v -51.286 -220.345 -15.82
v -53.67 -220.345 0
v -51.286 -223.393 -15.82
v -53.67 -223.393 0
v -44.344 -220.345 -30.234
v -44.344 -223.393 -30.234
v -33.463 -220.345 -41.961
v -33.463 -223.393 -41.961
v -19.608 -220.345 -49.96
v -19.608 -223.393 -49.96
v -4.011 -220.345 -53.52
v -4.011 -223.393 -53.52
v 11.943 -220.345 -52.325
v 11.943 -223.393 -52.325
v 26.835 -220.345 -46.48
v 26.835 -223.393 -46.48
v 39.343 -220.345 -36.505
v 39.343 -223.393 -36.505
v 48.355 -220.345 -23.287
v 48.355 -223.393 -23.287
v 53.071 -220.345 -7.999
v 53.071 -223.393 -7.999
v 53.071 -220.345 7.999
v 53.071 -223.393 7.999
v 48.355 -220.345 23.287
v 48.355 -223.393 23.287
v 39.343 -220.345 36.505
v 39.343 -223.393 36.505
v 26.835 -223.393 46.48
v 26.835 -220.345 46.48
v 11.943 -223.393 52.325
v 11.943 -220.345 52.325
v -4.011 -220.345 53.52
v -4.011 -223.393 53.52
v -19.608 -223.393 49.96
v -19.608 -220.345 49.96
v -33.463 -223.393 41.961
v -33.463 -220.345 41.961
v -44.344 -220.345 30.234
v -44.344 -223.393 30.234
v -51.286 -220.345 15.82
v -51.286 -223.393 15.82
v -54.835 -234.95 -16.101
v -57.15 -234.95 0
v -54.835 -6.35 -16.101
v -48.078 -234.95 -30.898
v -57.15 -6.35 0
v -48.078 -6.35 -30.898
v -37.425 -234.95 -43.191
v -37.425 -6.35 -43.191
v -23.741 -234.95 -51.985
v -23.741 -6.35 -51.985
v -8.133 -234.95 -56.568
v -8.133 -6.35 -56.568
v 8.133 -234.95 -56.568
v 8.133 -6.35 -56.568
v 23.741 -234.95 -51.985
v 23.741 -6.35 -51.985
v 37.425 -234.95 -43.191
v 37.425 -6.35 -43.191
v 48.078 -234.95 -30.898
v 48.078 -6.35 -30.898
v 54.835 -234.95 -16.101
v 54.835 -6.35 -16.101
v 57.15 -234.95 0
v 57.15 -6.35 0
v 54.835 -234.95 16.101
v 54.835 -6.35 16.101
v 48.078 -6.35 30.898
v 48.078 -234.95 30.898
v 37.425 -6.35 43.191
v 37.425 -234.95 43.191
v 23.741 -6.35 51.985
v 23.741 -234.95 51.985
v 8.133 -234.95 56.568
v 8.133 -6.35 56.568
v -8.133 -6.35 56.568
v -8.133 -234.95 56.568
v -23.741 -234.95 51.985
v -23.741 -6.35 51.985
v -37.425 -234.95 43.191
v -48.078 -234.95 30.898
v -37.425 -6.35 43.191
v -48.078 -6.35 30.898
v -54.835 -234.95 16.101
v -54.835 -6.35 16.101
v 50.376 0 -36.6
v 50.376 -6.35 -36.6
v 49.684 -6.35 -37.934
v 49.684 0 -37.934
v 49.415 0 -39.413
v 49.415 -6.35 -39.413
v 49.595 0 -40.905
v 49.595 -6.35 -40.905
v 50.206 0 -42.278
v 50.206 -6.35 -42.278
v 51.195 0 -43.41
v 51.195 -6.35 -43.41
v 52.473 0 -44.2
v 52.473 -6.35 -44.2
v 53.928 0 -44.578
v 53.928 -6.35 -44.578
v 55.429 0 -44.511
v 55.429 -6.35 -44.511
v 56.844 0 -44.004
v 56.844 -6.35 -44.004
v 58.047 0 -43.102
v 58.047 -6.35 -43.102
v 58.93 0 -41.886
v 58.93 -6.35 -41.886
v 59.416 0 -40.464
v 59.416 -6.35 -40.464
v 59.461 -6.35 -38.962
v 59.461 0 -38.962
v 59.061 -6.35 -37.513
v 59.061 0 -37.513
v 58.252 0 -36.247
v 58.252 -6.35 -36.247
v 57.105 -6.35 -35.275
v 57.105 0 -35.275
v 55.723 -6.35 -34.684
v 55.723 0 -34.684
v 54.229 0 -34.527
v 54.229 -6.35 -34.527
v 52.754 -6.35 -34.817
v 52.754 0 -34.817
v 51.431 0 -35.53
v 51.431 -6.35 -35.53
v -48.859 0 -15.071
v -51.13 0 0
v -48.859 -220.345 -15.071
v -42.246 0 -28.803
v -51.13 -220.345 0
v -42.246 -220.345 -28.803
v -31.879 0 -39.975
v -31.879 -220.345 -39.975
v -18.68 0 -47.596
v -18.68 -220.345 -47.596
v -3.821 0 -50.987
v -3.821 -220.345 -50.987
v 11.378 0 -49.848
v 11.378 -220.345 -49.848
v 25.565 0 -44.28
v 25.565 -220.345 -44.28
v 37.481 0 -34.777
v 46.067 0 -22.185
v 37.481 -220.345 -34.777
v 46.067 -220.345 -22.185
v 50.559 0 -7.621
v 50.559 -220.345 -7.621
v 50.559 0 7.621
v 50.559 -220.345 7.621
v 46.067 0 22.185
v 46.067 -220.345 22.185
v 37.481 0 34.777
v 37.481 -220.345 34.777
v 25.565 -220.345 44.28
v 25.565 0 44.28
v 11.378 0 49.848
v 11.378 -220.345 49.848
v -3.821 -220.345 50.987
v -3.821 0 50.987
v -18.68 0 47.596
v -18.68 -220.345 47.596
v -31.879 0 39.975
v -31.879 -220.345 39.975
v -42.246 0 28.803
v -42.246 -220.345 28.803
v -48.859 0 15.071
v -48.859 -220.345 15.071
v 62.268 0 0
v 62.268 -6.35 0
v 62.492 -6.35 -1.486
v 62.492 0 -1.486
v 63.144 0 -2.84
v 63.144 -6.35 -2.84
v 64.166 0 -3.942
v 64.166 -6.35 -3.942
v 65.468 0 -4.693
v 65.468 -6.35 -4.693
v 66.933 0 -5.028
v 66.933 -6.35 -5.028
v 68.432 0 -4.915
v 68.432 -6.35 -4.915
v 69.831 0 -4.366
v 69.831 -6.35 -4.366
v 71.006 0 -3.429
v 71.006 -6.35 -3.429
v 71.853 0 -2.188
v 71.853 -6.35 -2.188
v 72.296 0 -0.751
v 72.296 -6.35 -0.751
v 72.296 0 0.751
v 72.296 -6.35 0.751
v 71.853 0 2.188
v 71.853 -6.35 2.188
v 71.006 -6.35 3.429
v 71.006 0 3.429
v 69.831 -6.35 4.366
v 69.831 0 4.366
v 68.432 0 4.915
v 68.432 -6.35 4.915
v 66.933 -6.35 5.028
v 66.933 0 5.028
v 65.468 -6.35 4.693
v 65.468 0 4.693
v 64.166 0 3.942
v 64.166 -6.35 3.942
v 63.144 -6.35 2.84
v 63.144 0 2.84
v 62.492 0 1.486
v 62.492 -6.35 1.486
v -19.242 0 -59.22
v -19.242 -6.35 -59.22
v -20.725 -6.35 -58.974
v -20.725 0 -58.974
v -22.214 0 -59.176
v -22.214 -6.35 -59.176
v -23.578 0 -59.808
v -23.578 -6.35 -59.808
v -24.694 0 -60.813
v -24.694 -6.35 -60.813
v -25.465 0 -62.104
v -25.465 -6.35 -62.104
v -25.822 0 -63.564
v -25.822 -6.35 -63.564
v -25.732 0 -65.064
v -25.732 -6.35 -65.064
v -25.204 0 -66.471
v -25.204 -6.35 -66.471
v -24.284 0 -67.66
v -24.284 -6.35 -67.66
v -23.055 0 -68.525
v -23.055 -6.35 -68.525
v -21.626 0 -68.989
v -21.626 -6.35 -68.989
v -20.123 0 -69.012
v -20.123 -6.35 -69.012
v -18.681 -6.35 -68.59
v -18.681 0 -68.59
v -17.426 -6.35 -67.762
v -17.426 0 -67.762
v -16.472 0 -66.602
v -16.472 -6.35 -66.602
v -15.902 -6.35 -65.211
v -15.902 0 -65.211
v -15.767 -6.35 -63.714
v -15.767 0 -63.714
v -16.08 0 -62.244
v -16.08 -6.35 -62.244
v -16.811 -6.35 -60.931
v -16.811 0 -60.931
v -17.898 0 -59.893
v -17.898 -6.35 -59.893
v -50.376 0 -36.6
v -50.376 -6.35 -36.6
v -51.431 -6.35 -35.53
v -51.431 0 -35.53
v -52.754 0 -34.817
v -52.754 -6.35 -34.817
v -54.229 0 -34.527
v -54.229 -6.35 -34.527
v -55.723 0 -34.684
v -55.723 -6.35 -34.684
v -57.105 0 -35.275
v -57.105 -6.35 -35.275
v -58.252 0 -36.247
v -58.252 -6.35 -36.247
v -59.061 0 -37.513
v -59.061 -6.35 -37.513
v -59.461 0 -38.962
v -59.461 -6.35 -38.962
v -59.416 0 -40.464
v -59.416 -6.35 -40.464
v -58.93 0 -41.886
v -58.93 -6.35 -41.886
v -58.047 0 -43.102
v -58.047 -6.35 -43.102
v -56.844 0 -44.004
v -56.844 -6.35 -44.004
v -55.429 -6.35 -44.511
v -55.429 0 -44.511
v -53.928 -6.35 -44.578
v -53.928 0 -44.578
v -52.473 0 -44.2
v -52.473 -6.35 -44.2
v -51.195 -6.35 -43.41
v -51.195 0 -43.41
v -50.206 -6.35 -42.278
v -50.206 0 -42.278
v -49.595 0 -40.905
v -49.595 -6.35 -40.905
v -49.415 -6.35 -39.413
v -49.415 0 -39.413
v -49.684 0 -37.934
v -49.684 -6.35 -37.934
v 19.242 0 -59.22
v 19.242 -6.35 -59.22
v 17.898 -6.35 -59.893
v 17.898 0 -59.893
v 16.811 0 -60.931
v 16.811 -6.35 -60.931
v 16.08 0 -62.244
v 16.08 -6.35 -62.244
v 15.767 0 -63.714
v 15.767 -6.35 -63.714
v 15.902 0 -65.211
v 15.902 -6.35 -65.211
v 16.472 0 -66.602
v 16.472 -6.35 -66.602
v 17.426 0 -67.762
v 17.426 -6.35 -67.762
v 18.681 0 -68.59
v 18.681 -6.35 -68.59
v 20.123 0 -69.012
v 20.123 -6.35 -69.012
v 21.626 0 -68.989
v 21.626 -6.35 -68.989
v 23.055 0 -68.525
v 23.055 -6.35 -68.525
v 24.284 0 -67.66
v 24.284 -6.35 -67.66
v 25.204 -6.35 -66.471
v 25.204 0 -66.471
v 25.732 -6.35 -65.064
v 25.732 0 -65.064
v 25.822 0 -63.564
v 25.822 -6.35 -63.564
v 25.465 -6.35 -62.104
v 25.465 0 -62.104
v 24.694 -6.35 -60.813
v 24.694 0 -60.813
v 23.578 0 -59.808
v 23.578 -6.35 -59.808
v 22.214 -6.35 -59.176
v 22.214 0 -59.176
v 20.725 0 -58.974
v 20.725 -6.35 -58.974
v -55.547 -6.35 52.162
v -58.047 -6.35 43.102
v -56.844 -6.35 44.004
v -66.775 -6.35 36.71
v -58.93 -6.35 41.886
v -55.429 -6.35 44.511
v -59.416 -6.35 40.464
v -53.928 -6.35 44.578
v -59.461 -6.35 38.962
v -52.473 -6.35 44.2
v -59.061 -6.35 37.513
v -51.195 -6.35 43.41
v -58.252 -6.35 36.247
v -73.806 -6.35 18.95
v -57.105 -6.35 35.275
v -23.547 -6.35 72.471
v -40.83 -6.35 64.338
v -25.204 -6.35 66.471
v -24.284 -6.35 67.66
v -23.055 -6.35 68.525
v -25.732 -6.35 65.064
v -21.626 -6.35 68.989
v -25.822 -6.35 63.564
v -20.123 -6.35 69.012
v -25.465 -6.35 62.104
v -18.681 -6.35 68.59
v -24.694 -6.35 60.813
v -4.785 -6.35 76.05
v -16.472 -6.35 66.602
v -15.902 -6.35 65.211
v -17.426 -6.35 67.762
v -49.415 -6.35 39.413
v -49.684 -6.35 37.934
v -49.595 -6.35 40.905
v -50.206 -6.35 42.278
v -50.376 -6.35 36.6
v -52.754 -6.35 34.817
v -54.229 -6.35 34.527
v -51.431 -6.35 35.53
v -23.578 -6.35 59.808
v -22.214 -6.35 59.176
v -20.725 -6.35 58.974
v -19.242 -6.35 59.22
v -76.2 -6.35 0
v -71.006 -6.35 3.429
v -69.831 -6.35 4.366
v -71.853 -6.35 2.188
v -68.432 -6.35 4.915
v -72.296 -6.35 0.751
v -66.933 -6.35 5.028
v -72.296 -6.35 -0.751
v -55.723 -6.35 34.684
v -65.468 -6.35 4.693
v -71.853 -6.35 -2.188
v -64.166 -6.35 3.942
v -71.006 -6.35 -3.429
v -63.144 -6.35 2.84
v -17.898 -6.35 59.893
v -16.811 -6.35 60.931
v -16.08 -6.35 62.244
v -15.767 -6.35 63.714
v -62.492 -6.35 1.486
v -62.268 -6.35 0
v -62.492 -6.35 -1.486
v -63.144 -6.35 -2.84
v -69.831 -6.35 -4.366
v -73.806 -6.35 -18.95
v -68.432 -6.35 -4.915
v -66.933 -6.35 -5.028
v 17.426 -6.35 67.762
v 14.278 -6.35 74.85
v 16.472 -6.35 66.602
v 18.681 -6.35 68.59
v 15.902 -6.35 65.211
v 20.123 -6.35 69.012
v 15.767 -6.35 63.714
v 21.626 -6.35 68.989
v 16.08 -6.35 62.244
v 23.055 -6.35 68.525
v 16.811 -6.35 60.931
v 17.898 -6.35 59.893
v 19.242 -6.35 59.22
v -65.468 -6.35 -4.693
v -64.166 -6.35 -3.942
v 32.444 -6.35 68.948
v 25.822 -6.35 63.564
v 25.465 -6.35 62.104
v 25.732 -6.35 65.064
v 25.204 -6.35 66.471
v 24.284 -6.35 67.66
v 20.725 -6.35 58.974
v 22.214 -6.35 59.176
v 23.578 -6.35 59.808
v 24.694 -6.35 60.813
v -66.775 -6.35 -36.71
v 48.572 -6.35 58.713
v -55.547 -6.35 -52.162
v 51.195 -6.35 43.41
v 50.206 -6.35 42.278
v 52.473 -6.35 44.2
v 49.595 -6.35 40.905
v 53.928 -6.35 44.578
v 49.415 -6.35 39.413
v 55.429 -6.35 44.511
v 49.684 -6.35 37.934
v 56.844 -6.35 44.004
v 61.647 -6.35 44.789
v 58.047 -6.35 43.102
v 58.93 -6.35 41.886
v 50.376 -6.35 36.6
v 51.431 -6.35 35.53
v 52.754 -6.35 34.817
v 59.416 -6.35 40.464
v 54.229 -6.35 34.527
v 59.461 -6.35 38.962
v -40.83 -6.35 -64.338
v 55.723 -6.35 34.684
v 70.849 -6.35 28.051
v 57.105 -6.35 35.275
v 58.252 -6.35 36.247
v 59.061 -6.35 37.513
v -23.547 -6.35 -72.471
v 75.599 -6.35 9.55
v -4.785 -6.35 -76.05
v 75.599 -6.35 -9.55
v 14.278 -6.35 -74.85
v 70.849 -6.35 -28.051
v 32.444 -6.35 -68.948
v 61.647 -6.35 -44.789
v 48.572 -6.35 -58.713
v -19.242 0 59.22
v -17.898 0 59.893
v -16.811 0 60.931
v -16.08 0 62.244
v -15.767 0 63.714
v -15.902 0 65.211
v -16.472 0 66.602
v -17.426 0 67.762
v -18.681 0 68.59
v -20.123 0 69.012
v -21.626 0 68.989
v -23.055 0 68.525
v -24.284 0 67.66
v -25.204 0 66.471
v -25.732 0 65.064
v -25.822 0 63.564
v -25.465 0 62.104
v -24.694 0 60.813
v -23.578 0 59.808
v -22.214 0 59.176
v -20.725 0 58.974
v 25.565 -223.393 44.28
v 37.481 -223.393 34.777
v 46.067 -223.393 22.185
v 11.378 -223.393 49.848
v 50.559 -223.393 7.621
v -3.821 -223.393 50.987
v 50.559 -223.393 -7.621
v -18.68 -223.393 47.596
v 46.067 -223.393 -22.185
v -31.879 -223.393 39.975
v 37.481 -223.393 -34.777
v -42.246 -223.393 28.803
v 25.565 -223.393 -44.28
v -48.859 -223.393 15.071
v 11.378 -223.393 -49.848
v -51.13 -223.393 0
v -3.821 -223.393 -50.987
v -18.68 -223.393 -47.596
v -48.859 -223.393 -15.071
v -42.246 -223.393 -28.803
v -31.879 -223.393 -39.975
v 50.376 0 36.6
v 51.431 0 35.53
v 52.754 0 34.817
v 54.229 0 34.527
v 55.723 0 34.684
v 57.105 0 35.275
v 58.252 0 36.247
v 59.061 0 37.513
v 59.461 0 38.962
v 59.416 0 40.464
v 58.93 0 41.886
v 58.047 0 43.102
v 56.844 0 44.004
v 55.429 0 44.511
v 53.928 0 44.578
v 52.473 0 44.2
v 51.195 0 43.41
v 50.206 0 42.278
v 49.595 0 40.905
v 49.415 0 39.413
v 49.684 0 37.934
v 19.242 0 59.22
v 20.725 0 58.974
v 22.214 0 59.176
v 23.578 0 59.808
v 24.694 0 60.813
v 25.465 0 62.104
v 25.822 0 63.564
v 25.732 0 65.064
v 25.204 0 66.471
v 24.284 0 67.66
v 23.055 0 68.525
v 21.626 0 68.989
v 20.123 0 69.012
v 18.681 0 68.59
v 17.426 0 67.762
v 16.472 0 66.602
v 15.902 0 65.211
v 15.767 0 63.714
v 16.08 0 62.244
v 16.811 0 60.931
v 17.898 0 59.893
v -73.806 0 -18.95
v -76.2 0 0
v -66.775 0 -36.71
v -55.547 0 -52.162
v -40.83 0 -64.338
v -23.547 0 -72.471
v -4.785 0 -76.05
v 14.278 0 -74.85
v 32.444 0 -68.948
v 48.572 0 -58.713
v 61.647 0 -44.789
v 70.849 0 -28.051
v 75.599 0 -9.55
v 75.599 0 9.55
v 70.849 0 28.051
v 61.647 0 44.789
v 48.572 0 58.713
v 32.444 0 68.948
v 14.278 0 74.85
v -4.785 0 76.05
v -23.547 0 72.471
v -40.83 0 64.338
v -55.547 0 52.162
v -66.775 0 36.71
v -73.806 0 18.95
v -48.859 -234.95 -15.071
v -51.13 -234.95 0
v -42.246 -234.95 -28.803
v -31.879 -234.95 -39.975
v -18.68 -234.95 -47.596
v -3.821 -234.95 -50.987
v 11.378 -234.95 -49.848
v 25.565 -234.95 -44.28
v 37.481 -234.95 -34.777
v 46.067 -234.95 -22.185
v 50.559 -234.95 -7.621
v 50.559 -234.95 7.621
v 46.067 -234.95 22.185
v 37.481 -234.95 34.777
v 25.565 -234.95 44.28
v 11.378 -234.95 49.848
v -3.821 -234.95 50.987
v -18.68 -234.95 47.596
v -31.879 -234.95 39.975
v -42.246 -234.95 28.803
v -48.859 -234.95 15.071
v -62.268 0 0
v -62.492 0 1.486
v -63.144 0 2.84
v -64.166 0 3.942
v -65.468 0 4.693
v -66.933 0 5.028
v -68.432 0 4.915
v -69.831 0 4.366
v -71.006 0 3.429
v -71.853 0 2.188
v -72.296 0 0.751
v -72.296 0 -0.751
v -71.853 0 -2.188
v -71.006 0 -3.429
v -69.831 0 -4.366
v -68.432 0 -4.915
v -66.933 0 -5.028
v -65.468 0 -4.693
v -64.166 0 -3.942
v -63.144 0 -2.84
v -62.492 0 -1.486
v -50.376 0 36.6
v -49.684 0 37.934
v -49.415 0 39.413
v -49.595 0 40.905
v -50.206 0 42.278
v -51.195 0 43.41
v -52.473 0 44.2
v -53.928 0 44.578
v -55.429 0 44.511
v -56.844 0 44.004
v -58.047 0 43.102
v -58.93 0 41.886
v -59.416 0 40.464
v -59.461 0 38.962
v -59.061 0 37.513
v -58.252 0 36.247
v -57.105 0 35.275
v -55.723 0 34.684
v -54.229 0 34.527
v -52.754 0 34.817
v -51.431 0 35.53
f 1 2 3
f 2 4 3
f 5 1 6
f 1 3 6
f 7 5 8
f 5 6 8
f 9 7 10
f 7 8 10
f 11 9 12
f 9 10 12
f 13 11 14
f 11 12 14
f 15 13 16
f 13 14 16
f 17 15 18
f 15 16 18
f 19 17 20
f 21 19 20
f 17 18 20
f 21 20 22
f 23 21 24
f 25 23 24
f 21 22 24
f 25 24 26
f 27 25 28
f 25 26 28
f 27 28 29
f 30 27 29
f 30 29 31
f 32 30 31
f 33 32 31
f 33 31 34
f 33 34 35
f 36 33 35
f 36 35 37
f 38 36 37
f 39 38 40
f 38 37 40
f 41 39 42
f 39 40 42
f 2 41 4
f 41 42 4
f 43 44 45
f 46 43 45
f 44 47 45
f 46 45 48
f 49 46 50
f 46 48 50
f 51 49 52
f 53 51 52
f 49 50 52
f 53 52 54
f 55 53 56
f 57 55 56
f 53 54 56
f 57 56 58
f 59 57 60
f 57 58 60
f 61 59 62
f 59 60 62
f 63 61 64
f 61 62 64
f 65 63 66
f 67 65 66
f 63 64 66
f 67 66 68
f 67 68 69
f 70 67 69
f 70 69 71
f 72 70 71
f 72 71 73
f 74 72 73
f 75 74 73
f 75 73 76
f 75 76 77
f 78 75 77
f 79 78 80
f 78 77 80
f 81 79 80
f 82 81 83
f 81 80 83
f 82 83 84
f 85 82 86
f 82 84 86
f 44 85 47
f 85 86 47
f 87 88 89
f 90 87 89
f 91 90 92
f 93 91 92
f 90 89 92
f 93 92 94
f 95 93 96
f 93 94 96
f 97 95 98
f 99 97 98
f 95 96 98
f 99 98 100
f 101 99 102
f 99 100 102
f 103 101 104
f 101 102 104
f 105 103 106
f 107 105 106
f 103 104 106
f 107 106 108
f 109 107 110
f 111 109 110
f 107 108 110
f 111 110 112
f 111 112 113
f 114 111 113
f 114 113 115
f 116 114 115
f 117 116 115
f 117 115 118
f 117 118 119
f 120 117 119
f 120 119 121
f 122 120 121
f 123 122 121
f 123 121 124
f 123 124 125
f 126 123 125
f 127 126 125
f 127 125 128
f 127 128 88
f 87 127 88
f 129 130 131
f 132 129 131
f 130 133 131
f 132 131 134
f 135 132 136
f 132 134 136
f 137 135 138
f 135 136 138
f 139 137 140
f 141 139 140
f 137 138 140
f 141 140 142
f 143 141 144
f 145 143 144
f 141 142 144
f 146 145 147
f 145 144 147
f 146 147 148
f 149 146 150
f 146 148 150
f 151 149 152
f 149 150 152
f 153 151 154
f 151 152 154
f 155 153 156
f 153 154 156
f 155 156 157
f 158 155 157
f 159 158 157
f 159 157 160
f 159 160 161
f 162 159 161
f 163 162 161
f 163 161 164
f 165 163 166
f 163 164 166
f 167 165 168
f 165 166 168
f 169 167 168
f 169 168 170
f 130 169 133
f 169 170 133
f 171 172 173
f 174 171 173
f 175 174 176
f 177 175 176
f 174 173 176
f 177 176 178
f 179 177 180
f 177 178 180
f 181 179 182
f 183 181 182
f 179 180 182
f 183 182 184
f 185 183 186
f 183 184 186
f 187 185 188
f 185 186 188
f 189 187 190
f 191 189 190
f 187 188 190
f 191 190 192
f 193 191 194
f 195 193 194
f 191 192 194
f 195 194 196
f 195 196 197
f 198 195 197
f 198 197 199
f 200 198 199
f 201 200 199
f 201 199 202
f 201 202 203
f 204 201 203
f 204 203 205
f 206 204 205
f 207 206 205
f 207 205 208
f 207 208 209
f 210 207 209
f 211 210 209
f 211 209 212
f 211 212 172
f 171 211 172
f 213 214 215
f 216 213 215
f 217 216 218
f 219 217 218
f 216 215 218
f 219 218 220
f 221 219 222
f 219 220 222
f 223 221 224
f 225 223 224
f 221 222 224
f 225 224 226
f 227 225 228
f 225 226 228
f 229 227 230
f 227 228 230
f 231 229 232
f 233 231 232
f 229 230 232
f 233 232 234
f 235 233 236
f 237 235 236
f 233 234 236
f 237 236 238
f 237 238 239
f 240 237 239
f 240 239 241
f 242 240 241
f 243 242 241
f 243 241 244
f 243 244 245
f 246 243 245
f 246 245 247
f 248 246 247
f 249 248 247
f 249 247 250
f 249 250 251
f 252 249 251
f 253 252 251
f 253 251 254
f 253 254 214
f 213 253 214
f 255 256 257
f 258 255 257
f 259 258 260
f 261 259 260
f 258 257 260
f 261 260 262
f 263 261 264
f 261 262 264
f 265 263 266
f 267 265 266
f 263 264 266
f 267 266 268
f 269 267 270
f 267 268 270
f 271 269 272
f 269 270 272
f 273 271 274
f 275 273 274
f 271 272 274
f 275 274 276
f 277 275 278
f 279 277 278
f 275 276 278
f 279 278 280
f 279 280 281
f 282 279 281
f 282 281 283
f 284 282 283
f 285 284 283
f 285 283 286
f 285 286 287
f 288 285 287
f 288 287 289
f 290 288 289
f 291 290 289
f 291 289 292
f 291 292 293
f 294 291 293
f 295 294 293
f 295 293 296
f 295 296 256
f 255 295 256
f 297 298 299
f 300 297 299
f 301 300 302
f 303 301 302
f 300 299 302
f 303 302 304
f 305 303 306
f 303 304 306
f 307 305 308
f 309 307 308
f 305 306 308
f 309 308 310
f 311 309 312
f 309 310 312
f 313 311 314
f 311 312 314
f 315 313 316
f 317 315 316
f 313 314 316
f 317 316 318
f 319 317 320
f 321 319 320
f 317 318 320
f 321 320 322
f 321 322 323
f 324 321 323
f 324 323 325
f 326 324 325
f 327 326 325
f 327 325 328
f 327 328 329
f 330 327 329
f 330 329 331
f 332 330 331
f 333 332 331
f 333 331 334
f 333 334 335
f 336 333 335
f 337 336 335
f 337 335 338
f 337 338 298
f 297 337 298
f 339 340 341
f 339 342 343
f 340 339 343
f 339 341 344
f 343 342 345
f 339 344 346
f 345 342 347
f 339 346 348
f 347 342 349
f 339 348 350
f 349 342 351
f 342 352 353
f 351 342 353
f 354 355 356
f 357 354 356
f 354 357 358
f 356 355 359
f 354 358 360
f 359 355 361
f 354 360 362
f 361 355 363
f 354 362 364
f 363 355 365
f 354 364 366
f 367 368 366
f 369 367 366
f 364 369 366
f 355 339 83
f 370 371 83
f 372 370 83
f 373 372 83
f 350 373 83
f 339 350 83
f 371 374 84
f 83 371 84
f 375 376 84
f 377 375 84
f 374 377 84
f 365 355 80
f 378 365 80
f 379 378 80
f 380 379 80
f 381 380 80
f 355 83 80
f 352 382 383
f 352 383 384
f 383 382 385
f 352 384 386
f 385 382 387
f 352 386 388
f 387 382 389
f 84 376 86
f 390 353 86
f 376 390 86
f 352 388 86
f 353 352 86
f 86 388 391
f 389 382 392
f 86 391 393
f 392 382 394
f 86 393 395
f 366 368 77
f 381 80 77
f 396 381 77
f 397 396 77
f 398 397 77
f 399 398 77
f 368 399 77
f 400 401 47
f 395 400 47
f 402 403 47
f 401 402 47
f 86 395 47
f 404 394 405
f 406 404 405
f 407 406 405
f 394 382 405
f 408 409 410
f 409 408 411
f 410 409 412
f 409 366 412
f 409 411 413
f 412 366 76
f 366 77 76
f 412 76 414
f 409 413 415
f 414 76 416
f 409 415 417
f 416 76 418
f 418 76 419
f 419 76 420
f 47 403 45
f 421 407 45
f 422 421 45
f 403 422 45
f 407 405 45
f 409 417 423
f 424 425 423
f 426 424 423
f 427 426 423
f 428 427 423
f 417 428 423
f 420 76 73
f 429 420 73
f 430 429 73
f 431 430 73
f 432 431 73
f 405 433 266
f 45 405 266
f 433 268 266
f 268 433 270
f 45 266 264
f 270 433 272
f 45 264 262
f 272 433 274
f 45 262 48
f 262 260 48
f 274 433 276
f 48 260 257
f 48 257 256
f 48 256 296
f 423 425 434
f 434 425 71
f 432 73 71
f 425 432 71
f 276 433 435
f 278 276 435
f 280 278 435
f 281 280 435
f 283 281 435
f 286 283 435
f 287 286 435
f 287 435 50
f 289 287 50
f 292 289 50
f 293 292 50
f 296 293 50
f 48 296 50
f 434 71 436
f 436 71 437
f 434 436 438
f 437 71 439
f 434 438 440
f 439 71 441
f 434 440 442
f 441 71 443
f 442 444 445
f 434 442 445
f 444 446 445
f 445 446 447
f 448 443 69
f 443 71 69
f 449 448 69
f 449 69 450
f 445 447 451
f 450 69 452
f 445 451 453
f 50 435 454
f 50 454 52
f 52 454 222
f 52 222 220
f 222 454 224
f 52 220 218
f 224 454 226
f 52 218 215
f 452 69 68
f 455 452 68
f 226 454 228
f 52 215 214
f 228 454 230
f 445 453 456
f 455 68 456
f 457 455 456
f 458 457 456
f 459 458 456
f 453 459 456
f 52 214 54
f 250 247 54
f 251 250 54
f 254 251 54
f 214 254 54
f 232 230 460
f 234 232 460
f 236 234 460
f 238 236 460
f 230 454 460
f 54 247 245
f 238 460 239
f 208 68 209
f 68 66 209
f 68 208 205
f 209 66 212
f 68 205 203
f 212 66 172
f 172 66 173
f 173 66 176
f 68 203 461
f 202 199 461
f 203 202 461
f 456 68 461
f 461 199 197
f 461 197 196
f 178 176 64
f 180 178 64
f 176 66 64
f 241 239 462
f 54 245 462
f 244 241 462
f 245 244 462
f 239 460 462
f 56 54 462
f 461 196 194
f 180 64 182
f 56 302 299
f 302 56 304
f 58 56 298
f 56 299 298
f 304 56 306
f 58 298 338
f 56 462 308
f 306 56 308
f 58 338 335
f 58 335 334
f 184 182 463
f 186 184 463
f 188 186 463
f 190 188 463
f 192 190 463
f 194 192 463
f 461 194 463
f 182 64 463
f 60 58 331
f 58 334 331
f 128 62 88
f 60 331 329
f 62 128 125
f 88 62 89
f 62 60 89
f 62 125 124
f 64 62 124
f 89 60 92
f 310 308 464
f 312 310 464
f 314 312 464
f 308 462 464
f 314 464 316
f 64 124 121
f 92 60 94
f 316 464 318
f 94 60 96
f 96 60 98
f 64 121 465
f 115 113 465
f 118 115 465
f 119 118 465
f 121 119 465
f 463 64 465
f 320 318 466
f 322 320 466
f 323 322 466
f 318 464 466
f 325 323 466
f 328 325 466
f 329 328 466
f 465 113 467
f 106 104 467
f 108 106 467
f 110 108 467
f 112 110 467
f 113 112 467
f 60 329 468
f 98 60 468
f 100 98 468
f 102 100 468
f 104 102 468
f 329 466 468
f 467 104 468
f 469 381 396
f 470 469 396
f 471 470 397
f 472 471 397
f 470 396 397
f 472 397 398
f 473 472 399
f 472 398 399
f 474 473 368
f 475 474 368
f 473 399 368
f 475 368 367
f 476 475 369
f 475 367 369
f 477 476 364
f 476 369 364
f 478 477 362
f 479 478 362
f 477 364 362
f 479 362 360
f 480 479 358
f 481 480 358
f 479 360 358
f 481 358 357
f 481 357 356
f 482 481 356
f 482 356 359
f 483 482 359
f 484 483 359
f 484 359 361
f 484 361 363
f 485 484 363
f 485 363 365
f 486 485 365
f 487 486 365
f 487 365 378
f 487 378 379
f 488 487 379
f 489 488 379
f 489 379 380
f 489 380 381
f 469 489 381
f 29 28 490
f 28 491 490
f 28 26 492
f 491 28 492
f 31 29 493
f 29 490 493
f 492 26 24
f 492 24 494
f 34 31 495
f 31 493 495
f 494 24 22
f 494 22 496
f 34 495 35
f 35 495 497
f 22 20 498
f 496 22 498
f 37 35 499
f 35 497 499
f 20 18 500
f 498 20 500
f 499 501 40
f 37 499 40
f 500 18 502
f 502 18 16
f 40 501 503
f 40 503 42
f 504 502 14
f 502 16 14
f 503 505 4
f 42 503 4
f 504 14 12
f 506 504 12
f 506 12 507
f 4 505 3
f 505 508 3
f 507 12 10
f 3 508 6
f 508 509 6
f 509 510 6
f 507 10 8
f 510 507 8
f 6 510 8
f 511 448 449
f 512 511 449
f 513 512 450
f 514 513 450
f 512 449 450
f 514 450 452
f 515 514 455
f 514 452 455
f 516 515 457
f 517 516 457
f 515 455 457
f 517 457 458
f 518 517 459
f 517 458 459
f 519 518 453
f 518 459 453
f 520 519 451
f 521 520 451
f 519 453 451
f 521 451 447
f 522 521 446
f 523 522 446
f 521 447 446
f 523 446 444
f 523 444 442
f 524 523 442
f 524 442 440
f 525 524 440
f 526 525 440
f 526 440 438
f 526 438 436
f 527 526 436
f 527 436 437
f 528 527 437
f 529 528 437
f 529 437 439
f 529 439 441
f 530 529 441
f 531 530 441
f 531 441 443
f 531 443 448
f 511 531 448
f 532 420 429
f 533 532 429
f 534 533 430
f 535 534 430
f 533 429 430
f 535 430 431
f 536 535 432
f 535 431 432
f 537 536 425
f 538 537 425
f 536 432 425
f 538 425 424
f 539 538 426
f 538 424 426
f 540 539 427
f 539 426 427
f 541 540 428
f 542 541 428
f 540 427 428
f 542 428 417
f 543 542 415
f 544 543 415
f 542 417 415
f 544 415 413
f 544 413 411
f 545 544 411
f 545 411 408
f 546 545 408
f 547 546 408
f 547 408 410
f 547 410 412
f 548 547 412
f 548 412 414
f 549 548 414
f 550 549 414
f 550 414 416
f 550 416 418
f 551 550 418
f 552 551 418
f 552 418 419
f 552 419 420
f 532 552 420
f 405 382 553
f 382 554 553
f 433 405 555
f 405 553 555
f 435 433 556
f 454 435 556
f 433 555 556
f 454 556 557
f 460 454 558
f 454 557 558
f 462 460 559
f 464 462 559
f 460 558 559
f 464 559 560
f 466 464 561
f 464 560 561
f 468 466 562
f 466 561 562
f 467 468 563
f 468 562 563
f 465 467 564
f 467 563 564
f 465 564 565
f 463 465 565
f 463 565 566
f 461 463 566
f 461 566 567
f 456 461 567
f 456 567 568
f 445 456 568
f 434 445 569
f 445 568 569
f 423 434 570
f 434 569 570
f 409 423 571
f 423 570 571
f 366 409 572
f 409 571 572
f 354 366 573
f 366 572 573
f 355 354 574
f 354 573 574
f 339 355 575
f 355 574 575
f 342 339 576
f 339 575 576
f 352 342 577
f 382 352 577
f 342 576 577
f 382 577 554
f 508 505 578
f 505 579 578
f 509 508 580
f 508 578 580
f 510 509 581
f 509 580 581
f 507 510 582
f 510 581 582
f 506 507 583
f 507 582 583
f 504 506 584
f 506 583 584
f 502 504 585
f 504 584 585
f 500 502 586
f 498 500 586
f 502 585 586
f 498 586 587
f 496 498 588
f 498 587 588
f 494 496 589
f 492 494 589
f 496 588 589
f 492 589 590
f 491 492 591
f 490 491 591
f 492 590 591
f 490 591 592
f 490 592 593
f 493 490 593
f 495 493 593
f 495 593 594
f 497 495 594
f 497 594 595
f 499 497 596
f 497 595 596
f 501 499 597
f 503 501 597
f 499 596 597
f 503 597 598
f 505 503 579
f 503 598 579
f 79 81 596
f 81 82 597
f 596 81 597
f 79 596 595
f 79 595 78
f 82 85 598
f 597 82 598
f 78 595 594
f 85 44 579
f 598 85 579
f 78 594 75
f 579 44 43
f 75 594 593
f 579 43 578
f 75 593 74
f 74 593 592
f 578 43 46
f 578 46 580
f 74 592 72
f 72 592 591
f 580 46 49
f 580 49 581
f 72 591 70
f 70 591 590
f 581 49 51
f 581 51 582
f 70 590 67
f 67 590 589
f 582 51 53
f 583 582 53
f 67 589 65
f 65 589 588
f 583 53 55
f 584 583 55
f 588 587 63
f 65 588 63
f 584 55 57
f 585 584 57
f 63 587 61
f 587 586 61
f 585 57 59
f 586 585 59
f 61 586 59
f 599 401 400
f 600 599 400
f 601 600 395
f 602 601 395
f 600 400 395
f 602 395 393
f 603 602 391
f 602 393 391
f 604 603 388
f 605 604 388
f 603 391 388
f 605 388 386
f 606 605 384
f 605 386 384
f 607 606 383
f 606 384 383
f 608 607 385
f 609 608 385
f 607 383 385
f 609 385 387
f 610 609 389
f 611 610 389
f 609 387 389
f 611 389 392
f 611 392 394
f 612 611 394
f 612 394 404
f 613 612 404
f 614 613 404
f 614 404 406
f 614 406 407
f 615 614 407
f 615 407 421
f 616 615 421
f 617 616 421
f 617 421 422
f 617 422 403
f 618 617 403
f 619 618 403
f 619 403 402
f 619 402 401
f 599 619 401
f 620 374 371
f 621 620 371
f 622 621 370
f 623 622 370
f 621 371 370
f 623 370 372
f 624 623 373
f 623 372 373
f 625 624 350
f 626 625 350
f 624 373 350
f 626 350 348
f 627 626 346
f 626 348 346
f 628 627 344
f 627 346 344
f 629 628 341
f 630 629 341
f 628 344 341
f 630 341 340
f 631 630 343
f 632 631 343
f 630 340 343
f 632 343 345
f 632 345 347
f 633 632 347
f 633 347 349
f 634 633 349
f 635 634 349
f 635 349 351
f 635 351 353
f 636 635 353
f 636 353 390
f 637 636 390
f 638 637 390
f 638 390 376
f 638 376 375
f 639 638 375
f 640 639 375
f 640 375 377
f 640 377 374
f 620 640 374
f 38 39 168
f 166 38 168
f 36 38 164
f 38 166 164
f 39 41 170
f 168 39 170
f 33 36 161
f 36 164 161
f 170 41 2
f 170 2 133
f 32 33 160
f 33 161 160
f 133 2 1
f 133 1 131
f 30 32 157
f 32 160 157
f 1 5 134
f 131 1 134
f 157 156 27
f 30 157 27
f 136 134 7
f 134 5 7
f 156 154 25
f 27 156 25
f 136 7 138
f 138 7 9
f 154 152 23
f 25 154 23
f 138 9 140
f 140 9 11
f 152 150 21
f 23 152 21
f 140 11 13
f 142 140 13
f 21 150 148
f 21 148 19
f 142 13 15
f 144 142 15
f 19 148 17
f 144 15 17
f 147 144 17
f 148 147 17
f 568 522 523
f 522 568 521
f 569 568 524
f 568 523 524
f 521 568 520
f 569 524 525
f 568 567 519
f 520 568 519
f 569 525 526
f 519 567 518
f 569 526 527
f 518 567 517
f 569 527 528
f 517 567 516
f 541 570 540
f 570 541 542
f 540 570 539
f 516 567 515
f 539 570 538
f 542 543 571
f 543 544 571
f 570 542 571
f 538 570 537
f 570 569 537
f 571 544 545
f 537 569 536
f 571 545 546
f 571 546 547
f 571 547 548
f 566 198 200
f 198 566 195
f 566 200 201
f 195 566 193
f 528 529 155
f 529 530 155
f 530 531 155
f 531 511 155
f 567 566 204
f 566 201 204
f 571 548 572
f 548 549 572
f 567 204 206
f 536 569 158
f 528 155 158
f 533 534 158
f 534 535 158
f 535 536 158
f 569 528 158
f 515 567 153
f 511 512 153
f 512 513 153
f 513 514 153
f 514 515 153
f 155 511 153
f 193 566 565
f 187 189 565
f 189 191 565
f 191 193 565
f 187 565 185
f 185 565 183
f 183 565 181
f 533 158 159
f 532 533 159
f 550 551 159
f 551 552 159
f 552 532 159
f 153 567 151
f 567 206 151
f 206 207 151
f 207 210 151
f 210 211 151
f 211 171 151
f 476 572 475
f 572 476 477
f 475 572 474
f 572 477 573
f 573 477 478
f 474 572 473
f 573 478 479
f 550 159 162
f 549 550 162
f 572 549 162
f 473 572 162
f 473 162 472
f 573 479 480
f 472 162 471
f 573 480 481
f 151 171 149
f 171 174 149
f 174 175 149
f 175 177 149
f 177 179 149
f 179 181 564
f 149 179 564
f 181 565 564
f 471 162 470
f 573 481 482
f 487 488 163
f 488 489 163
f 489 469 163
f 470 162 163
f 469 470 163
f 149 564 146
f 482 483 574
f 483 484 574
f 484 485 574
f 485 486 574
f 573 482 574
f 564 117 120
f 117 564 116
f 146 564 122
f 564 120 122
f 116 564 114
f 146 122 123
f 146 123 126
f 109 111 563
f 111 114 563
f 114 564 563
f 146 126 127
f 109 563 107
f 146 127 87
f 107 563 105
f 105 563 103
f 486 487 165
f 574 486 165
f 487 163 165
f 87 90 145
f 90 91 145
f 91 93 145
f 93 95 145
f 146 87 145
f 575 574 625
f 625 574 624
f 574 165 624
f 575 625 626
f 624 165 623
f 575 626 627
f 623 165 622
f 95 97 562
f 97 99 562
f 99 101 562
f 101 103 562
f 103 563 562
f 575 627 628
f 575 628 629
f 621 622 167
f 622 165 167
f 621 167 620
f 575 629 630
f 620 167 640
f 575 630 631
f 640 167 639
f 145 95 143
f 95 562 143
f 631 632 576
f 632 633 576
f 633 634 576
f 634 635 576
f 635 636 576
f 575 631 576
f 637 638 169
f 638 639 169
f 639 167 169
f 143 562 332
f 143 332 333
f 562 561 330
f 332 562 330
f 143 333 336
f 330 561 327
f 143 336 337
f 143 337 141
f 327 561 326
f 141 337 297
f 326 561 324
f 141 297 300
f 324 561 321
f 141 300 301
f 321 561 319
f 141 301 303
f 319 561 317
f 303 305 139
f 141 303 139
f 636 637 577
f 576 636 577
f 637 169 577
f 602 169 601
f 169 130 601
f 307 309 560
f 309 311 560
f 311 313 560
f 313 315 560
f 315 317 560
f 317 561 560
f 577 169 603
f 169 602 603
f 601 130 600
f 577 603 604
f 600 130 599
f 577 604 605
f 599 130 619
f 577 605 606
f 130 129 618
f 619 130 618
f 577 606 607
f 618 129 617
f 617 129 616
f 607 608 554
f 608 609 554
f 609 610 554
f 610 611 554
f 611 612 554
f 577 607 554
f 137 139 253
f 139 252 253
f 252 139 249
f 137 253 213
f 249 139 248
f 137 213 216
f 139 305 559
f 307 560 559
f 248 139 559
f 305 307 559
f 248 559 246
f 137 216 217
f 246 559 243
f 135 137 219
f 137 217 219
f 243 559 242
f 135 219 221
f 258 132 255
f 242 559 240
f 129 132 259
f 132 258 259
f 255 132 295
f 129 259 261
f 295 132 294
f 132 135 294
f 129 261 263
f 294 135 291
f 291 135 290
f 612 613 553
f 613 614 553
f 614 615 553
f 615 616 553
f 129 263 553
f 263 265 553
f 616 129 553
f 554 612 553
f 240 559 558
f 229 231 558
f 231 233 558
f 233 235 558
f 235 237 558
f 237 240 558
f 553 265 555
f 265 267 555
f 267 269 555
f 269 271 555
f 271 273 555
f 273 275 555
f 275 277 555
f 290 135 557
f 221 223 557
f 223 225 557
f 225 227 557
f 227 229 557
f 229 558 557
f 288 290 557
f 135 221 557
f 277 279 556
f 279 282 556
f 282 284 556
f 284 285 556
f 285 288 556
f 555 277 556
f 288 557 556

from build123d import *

# Parameters (mm, degrees)
TAP_DRILL_FOR_3_8_16_TAP1_D = 10.0838
CIRPATTERN1_COUNT           = 10


with BuildPart() as part:
    # Sketch1 → Revolve1 (revolve)
    with BuildSketch(Plane.XY, mode=Mode.PRIVATE) as revolve1_sk:
        Polygon((51.1302, 0), (51.1302, -220.345), (53.6702, -220.345), (53.6702, -223.393), (51.1302, -223.393), (51.1302, -234.95), (57.15, -234.95), (57.15, -6.35), (76.2, -6.35), (76.2, 0), align=None)
    revolve(revolve1_sk.sketch.rotate(Axis((0, 0, 0), (0, -1, 0)), 180), axis=Axis((0, 0, 0), (0, -1, 0)))

    # Tap Drill for 3/8-16 Tap1 (through all)
    with Locations(Plane(origin=(0, 0, 0), x_dir=(1, 0, 0), z_dir=(0, 1, 0))):
        with Locations((67.31, 0)):
            tap_drill_for_3_8_16_tap1 = Hole(TAP_DRILL_FOR_3_8_16_TAP1_D / 2)

    # CirPattern1: Tap Drill for 3/8-16 Tap1 ×10 about axis
    cirpattern1_axis = Axis((0, 0, 0), (0, 1, 0))
    for i in range(1, CIRPATTERN1_COUNT):
        add(tap_drill_for_3_8_16_tap1.rotate(cirpattern1_axis, i * 360 / CIRPATTERN1_COUNT), mode=Mode.SUBTRACT)


solid = part.part
